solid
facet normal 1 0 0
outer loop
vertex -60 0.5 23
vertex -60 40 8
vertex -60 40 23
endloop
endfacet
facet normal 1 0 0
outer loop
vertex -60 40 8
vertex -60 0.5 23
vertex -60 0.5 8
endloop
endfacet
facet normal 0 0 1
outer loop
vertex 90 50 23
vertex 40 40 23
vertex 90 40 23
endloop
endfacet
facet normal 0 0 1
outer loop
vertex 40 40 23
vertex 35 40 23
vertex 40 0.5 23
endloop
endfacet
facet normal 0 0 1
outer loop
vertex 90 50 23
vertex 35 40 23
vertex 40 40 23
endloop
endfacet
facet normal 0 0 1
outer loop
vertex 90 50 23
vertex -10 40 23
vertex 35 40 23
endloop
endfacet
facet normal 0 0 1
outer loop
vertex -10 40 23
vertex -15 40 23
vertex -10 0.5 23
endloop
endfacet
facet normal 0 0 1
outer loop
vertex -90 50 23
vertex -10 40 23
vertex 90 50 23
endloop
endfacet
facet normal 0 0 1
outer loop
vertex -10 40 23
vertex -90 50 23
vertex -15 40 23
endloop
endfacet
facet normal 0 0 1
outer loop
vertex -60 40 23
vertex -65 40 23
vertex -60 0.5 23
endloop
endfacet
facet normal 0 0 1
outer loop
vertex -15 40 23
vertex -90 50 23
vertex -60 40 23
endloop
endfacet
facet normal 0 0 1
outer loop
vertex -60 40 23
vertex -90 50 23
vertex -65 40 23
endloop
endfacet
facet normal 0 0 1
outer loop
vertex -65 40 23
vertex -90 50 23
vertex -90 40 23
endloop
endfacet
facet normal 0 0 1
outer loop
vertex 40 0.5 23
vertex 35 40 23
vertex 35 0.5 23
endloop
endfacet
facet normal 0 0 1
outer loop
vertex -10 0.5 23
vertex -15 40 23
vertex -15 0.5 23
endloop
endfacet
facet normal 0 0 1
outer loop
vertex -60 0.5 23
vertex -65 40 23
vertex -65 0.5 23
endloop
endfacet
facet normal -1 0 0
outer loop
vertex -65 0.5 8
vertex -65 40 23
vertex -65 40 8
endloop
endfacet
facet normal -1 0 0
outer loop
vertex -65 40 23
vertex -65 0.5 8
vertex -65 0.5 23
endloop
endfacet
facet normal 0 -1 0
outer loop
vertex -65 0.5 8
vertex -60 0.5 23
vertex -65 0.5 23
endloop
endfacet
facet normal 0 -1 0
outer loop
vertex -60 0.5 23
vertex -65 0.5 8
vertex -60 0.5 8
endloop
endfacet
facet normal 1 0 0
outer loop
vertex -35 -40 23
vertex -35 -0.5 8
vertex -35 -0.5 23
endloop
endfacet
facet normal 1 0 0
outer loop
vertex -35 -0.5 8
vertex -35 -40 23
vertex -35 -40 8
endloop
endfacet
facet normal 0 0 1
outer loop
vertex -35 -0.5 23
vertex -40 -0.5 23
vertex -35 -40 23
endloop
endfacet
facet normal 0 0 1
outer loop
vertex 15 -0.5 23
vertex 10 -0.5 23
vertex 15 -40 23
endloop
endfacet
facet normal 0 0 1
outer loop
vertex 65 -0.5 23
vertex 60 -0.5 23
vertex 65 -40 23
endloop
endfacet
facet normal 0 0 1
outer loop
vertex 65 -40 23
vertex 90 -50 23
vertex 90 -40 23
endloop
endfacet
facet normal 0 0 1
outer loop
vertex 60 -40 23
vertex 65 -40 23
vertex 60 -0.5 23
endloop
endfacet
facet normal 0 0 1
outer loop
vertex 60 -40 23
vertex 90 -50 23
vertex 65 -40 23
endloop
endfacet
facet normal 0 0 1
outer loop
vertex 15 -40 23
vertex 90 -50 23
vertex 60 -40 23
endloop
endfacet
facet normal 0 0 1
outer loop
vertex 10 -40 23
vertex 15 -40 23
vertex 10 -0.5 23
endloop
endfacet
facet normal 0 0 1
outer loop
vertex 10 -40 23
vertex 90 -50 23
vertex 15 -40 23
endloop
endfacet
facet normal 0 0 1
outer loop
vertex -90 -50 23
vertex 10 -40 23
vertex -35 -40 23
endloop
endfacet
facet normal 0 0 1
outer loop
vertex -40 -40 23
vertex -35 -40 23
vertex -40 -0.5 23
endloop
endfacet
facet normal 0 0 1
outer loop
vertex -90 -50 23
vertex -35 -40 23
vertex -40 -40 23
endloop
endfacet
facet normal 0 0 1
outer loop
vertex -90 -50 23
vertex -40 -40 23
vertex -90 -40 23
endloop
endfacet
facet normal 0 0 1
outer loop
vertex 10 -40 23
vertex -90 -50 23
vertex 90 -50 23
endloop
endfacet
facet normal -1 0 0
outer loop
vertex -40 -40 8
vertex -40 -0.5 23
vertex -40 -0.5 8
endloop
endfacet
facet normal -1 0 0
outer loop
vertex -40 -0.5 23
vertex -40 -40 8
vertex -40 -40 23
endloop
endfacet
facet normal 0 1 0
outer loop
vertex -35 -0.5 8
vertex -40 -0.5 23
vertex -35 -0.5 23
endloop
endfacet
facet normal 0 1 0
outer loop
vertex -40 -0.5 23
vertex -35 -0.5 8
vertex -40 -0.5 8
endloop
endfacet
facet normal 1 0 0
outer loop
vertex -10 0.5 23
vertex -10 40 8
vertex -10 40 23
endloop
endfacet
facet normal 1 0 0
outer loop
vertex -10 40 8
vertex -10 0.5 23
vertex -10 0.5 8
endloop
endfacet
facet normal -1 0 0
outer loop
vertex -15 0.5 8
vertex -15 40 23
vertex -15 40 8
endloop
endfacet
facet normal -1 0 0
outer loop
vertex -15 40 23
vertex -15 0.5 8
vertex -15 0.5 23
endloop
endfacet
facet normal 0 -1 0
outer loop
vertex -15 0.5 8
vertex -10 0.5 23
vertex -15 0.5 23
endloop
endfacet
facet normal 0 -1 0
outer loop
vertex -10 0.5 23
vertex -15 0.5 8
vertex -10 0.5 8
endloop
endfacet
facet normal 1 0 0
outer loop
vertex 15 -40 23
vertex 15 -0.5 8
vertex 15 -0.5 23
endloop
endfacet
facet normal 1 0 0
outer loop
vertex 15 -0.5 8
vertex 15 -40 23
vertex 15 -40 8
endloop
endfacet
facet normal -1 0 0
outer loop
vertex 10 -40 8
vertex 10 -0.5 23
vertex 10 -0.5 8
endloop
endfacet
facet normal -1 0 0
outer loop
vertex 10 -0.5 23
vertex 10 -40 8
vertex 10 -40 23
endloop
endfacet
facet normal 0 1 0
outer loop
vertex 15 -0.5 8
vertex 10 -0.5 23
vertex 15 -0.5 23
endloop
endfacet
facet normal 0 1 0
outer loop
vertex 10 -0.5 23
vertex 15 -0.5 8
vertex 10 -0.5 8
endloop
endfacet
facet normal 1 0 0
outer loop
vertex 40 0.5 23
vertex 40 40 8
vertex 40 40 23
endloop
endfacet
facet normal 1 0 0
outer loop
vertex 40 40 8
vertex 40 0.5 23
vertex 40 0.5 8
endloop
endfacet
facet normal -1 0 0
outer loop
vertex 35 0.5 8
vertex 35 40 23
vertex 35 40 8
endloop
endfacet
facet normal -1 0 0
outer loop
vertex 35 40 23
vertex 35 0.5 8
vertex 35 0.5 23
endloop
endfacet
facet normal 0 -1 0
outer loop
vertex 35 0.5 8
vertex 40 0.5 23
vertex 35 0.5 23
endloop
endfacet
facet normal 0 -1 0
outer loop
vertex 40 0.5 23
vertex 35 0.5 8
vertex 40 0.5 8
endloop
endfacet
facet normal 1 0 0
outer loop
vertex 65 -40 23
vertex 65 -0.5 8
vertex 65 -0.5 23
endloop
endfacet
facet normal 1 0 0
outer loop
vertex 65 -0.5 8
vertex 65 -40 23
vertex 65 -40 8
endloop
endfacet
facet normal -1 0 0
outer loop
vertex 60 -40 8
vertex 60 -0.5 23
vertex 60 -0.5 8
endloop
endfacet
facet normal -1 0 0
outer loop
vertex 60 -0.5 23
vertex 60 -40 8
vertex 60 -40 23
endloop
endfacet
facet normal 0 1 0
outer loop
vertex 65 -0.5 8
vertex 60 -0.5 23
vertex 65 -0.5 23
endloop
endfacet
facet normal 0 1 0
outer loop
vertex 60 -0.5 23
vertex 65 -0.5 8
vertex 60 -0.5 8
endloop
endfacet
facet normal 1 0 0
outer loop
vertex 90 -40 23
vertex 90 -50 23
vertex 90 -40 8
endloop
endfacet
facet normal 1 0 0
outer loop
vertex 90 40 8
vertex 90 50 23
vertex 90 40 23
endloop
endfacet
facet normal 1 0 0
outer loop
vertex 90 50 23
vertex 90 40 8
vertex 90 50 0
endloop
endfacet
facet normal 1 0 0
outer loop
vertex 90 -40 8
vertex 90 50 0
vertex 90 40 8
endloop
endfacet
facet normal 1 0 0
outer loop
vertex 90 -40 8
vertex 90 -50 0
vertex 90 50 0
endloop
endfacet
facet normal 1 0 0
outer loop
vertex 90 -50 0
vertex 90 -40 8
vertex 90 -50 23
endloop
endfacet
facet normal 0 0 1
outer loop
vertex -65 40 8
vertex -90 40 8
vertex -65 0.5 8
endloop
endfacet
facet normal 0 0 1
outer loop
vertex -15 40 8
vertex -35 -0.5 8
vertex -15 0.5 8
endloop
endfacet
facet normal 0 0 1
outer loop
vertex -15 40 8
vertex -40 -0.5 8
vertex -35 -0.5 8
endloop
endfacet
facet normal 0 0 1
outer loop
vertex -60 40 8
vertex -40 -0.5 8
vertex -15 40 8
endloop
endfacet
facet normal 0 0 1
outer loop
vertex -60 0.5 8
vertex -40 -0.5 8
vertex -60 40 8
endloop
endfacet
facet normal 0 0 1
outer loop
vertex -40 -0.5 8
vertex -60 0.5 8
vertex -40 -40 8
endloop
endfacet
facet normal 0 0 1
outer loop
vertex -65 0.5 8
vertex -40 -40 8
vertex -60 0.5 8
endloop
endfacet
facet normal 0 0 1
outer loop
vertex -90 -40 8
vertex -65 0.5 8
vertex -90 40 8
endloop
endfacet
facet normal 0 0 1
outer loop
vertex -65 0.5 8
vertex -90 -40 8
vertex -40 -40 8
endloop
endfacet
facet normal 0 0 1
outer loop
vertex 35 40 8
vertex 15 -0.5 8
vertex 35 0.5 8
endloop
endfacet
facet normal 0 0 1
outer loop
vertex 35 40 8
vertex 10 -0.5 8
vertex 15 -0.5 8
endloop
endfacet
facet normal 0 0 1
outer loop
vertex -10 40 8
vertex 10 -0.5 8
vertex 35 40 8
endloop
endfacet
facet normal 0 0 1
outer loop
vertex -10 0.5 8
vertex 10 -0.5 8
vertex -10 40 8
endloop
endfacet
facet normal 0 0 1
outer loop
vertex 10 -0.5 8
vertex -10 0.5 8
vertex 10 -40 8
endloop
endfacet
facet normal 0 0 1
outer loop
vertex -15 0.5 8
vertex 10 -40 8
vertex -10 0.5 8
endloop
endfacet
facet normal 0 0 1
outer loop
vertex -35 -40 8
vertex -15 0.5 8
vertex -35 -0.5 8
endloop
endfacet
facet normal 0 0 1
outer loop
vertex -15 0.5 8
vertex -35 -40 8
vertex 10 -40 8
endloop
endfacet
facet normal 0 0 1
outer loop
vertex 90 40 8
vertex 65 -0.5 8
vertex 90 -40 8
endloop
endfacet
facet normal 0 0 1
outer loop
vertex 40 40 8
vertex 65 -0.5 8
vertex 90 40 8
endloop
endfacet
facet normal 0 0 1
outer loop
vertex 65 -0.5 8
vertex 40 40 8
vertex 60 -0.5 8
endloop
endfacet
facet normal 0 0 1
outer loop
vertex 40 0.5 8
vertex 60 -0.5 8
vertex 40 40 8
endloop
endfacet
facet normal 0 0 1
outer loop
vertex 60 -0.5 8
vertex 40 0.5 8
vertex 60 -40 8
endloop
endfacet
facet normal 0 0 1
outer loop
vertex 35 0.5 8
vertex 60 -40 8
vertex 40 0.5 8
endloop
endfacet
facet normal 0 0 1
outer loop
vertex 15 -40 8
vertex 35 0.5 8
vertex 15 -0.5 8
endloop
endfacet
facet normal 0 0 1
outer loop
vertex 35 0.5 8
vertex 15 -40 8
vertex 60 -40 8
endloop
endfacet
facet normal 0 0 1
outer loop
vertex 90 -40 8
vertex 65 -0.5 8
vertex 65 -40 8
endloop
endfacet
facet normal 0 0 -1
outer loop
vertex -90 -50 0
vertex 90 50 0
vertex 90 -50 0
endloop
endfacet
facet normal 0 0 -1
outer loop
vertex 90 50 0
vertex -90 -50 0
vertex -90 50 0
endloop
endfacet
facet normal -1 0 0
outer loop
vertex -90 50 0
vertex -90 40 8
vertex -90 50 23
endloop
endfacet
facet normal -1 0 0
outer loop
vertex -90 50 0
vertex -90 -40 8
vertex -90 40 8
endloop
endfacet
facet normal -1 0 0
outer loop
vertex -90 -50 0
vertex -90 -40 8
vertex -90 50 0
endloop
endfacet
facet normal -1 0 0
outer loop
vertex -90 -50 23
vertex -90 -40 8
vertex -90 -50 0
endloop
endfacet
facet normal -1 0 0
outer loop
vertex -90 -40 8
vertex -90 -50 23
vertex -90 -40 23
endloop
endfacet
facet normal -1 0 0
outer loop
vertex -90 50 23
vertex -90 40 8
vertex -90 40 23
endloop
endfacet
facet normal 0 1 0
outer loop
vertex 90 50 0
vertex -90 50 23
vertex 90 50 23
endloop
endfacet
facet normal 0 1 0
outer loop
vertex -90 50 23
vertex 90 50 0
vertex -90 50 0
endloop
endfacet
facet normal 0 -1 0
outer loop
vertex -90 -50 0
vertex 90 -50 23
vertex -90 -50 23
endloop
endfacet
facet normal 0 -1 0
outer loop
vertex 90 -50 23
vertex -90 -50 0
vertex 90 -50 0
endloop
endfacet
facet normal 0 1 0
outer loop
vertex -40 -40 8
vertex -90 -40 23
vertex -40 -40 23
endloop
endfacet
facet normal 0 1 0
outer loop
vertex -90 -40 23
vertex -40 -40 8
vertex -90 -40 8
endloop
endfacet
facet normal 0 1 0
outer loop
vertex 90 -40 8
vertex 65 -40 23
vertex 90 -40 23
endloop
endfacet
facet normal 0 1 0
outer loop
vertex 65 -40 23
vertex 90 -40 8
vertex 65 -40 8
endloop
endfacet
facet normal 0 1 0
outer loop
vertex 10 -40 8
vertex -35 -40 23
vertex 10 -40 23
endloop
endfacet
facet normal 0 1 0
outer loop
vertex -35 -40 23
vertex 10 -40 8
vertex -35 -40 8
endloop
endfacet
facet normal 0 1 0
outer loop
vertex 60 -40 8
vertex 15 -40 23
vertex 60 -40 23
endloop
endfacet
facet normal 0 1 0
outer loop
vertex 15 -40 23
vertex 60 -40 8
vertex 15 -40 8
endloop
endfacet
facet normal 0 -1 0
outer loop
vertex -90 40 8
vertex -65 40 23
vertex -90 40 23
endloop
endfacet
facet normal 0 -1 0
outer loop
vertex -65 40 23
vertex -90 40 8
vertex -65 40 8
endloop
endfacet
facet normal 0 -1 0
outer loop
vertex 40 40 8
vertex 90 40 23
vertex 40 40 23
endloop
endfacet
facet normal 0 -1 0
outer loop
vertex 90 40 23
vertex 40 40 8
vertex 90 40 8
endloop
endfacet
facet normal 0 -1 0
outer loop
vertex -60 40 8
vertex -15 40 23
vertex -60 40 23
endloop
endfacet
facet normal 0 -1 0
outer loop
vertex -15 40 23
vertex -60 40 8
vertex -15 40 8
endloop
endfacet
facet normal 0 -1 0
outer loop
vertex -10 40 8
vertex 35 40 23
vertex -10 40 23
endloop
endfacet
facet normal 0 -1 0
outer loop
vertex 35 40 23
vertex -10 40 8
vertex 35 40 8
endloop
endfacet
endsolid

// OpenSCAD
$fn = 32;

// ----------------------------------------------------------------------
// Rib frame 180 x 100 x 23
// 6 ribs at 25 mm pitch, staggered
// ----------------------------------------------------------------------

// --- parameters (mm) ---
frame = [180, 100, 8];  // base plate size (x, y, z)
rail_w = 10;            // side rail width
ribs = 6;               // number of ribs
rib_t = 5;              // rib thickness
rib_h = 15;             // rib height above the base plate
pitch = 25;             // pitch between rib centres

// --- derived feature positions (mm) ---
span = (ribs - 1) * pitch;          // = 125   distance between the outer ribs
origin_x = -span / 2;               // = -62.5   X of the first rib
rib_len = frame[1] / 2 - rail_w + 0.5;  // = 40.5   length of a staggered rib
rib_y = 0.5 + rib_len / 2;          // = 20.75   Y of a staggered rib centre
row_offset = 2 * rib_y;             // = 41.5   distance between the two rows
feature_centers = [
  [origin_x + 0 * pitch, rib_y],
  [origin_x + 1 * pitch, -rib_y],
  [origin_x + 2 * pitch, rib_y],
  [origin_x + 3 * pitch, -rib_y],
  [origin_x + 4 * pitch, rib_y],
  [origin_x + 5 * pitch, -rib_y]
];   // rib centre line, drives the rib loop

// base plate, two side rails, then the ribs read straight off feature_centers
union() {
  translate([-frame[0] / 2, -frame[1] / 2, 0]) cube(frame);
  translate([-frame[0] / 2, -frame[1] / 2, 0]) cube([frame[0], rail_w, frame[2] + rib_h]);
  translate([-frame[0] / 2, frame[1] / 2 - rail_w, 0]) cube([frame[0], rail_w, frame[2] + rib_h]);
  for (centre = feature_centers)
    translate([centre[0] - rib_t / 2, centre[1] - rib_len / 2, frame[2] - 1])
      cube([rib_t, rib_len, rib_h + 1]);
}
